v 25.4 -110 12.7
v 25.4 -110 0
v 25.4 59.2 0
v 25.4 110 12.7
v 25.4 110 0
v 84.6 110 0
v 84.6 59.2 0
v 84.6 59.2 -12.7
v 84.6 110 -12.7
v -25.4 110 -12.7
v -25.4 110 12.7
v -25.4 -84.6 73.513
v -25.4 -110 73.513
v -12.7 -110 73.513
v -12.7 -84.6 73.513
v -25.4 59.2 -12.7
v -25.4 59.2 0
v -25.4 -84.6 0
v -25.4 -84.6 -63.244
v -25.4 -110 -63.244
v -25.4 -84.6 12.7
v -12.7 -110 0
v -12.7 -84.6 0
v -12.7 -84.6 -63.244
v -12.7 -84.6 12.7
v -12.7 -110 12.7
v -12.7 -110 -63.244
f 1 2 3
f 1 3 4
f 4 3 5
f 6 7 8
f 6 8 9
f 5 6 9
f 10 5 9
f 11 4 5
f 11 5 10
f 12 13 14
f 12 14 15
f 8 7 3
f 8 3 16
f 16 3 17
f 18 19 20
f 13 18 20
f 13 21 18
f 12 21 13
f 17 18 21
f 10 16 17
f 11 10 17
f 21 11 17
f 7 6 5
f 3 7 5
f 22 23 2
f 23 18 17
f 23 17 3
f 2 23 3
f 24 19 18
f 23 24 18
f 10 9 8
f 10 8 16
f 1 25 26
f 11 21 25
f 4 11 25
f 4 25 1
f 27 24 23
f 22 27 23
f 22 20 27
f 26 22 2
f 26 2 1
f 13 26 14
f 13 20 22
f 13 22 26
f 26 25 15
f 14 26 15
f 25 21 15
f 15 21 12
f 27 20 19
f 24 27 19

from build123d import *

# Parameters (mm, degrees)
CROQUIS1_W              = 50.8
CROQUIS1_H              = 220
SALIENTE_EXTRUIR1_DEPTH = 12.7
CROQUIS2_W              = 110
CROQUIS2_H              = 50.8
SALIENTE_EXTRUIR2_DEPTH = 12.7
CROQUIS3_W              = 136.757374057
CROQUIS3_H              = 25.4
SALIENTE_EXTRUIR3_DEPTH = 12.7


with BuildPart() as part:
    # Croquis1 → Saliente-Extruir1 (new body)
    with BuildSketch(Plane.XY):
        Rectangle(CROQUIS1_W, CROQUIS1_H)
    extrude(amount=SALIENTE_EXTRUIR1_DEPTH)

    # Croquis2 → Saliente-Extruir2 (add)
    with BuildSketch(Plane(origin=(0, 0, 0), x_dir=(-1, 0, 0), z_dir=(0, 0, -1))):
        with Locations((-29.6, 84.6)):
            Rectangle(CROQUIS2_W, CROQUIS2_H)
    extrude(amount=SALIENTE_EXTRUIR2_DEPTH)

    # Croquis3 → Saliente-Extruir3 (add)
    with BuildSketch(Plane.ZY.offset(25.4)):
        with Locations((5.134235887, -97.3)):
            Rectangle(CROQUIS3_W, CROQUIS3_H)
    extrude(amount=-SALIENTE_EXTRUIR3_DEPTH)


solid = part.part
